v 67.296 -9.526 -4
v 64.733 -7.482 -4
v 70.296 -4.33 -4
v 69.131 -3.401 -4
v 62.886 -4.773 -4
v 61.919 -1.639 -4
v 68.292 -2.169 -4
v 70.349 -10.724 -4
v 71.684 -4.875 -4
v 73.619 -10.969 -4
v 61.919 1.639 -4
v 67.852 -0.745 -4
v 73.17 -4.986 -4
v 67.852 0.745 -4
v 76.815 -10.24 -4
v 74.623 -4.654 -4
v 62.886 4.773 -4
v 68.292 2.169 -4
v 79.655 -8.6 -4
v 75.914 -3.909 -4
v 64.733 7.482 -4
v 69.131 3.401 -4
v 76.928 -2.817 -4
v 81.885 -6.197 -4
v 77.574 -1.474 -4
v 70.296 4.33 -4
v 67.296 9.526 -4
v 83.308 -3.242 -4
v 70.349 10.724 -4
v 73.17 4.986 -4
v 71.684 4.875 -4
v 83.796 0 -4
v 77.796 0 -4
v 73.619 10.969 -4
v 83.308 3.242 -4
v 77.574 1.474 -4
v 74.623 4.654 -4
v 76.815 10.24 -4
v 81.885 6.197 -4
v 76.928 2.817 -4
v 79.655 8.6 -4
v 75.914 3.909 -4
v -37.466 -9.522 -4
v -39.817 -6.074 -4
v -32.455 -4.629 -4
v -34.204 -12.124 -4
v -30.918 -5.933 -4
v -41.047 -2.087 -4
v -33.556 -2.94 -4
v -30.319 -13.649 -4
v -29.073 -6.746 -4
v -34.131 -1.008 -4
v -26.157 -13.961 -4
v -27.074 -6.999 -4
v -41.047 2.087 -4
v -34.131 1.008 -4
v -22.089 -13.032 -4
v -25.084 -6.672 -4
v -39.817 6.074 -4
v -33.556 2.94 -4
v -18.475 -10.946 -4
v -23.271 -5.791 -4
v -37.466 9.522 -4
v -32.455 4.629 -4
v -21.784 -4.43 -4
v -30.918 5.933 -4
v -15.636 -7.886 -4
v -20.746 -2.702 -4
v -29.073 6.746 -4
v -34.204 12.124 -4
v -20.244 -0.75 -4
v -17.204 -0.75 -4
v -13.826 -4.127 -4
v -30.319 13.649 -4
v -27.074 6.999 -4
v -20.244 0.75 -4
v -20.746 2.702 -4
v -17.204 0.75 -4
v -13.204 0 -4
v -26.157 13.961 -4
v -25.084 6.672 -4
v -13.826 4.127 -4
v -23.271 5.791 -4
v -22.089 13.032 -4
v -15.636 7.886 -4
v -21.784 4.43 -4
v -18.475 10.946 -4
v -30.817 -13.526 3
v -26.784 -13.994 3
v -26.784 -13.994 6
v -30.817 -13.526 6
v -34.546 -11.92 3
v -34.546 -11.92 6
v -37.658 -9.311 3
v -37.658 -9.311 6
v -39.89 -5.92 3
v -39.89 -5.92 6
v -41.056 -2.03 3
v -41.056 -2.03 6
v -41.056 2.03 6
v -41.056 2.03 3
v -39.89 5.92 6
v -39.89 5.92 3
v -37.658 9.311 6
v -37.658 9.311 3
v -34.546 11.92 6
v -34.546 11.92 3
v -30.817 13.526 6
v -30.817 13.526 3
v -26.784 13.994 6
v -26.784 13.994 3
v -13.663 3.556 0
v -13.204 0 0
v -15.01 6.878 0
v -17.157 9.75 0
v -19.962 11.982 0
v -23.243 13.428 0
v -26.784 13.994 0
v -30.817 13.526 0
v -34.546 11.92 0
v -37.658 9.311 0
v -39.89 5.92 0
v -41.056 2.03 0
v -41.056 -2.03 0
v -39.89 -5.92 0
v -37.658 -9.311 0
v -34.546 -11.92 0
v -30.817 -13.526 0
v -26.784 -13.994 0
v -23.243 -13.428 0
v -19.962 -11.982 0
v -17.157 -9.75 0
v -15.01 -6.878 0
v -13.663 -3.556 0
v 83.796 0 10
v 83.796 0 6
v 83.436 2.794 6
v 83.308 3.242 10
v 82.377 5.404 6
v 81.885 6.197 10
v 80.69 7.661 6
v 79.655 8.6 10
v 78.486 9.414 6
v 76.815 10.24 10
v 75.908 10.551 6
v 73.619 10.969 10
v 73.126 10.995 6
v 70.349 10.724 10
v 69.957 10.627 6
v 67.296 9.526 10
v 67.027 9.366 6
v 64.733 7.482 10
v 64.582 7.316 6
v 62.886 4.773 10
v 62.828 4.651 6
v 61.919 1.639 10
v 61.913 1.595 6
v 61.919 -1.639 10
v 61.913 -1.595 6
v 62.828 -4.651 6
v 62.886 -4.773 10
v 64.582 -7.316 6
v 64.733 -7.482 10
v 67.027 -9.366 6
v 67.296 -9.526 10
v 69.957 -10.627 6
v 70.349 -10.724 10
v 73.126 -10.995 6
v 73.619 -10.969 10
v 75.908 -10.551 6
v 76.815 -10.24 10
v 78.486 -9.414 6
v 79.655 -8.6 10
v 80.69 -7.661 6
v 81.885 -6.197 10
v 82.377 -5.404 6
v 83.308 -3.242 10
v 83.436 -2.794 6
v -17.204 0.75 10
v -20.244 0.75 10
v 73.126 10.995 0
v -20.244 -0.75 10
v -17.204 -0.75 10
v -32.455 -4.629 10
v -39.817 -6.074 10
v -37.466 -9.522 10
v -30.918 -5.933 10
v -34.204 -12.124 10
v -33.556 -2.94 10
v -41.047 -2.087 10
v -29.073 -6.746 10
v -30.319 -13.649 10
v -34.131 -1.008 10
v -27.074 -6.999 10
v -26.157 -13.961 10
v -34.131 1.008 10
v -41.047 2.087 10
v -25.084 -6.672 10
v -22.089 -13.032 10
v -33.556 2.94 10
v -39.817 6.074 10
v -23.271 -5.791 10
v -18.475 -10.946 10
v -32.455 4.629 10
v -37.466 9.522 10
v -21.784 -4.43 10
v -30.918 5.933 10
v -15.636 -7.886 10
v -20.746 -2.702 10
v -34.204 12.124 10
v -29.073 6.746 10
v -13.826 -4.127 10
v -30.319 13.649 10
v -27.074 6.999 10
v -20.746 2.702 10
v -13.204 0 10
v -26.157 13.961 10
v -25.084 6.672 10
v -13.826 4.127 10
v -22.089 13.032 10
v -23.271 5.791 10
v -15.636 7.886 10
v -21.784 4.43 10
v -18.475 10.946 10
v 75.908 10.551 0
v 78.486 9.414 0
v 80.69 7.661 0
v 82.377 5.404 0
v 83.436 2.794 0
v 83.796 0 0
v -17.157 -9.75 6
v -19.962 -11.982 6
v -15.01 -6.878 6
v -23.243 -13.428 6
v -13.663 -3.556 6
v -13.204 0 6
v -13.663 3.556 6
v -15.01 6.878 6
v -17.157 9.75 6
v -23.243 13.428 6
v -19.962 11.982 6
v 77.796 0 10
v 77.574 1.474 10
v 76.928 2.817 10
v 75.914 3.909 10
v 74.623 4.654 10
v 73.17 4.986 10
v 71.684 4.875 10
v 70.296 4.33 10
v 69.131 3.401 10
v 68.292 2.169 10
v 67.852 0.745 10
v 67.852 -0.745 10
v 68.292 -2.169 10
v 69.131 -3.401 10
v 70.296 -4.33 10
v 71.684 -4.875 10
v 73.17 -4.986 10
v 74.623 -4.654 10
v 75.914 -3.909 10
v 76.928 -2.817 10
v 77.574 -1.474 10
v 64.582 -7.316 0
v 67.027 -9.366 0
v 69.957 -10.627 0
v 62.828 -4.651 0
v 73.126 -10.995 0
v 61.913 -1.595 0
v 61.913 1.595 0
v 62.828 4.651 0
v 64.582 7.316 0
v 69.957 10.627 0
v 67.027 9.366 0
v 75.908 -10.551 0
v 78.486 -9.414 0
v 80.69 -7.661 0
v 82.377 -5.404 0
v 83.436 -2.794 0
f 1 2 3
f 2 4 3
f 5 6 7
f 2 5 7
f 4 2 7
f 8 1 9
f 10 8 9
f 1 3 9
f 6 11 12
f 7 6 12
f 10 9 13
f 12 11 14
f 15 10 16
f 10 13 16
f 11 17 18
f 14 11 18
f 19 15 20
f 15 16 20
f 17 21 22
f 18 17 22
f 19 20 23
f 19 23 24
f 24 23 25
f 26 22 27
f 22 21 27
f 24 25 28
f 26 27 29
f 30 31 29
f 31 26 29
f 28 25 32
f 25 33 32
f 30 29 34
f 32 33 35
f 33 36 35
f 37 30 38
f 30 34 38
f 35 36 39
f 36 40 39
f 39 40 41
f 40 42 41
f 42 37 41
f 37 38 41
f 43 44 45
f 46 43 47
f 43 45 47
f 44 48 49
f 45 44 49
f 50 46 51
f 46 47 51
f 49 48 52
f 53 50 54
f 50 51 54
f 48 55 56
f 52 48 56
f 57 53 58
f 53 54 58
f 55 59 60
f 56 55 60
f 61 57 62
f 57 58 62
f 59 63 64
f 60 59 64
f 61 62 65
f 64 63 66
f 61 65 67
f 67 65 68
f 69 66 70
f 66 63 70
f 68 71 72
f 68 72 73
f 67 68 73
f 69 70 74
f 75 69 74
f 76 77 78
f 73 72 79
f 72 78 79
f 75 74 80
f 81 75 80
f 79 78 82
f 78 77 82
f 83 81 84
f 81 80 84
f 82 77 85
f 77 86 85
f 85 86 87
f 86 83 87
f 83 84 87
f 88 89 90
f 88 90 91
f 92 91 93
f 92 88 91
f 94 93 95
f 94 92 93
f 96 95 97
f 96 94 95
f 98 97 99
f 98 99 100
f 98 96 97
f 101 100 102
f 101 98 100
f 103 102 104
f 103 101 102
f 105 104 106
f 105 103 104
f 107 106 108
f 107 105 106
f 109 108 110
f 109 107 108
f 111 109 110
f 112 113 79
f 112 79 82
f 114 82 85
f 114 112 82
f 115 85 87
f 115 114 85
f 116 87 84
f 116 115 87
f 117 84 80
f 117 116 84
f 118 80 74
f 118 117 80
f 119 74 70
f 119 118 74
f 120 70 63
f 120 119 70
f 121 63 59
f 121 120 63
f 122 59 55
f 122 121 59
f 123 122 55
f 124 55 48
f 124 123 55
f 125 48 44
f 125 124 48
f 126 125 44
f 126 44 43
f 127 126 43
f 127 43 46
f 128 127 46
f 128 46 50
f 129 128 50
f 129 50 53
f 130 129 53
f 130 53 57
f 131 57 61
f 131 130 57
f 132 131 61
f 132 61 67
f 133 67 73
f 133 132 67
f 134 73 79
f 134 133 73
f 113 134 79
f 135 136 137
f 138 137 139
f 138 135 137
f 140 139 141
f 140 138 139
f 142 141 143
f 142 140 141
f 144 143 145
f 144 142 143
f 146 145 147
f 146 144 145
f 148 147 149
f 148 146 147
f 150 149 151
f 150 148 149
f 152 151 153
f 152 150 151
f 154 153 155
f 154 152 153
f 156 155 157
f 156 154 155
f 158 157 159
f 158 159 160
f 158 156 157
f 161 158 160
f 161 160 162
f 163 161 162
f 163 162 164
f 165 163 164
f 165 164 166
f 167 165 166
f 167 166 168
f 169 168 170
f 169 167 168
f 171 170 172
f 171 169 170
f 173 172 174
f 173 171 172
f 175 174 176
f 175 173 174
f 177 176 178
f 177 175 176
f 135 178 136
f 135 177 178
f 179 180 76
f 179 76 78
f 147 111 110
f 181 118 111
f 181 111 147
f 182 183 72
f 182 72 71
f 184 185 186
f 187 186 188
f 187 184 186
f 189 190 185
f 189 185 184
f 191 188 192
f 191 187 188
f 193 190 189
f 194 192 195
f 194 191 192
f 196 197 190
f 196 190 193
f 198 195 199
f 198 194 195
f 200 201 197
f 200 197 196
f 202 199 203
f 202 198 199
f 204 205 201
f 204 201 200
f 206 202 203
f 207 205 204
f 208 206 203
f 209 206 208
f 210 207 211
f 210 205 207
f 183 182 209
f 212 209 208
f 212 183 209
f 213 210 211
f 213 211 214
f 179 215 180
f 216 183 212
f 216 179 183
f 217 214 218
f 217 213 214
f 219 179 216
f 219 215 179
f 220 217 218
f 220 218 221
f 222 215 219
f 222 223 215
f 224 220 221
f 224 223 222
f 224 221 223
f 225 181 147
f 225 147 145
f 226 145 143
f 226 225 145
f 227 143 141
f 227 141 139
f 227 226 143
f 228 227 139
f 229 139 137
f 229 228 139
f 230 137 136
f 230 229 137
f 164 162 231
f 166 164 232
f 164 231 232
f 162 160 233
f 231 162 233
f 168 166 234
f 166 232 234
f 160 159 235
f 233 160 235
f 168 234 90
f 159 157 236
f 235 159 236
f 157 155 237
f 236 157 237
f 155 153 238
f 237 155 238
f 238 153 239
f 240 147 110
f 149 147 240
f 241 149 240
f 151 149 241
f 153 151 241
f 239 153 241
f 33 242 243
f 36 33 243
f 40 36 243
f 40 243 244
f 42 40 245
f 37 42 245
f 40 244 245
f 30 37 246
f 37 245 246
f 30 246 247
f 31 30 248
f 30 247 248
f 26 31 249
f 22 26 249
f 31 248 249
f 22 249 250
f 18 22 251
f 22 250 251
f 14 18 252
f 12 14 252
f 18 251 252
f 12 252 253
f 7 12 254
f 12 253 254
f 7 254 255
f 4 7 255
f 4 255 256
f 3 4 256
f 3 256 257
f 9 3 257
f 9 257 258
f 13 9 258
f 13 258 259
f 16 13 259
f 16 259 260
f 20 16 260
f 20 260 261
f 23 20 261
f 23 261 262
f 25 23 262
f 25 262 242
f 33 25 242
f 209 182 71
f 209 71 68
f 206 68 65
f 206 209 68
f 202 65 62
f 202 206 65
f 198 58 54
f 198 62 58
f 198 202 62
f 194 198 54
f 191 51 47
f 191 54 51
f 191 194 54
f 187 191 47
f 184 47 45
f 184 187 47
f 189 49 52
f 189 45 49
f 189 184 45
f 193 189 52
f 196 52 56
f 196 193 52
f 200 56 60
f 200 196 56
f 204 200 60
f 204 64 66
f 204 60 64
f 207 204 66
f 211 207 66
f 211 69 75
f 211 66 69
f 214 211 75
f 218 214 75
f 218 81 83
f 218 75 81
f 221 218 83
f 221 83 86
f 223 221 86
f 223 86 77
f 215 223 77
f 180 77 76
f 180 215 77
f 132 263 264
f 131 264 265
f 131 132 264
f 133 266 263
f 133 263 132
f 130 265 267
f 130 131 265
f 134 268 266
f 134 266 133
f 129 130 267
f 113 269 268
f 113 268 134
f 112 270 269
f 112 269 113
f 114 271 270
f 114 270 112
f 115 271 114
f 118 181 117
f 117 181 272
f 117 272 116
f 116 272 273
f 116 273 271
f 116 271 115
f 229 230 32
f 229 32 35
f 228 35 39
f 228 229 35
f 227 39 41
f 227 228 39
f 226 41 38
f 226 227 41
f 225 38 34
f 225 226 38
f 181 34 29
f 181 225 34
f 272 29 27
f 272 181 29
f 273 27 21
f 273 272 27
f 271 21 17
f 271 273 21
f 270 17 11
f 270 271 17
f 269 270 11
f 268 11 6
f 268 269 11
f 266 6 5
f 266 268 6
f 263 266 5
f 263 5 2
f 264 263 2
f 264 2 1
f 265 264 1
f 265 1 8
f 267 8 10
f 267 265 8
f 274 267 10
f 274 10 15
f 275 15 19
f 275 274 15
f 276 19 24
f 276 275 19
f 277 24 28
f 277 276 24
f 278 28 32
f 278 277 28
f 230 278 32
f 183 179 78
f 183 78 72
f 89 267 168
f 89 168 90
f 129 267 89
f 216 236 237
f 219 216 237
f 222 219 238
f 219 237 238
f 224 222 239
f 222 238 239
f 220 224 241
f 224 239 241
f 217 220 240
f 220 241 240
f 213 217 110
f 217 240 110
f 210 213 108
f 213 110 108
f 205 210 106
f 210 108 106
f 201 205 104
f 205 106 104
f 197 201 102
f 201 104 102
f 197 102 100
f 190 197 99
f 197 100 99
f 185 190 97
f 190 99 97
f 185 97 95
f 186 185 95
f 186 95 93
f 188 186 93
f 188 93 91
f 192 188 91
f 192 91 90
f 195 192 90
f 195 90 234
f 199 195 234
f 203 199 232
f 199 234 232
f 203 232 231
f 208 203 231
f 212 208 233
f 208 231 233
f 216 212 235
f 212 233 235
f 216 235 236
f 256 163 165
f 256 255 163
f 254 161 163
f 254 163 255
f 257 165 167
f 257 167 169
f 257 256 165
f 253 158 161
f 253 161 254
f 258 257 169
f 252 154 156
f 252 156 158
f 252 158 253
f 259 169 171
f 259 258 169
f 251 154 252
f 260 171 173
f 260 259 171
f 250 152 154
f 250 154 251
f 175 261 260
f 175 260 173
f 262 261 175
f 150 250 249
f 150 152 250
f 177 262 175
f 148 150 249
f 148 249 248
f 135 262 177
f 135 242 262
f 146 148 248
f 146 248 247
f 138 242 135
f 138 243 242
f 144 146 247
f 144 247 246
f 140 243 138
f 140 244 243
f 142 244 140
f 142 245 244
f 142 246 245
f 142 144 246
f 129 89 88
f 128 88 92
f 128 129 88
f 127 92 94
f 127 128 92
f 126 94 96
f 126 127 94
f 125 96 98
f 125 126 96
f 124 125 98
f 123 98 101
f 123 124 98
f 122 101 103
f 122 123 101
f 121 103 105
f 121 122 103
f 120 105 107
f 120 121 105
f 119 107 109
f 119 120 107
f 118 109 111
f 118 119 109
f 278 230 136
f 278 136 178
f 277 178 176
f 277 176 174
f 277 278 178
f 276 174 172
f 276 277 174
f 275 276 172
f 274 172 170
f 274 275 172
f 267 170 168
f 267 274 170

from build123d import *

# Parameters (mm, degrees)
EXTRUDE_1_DEPTH     = 6
SKETCH_3_R          = 14
SKETCH_3_R_2        = 11
EXTRUDE_3_DEPTH     = 7
SKETCH_4_R          = 5
CUT_EXTRUDE_1_DEPTH = 87.103712829


with BuildPart() as part:
    # 草图1 → 凸台-拉伸1 (new body)
    with BuildSketch(Plane.XY):
        with BuildLine():
            Line((-26.783524162, 13.993698582), (73.126475838, 10.995048886))
            ThreePointArc((73.126475838, 10.995048886), (83.796475838, 0), (73.126475838, -10.995048886))
            Line((73.126475838, -10.995048886), (-26.783524162, -13.993698582))
            ThreePointArc((-26.783524162, -13.993698582), (-41.203524162, 0), (-26.783524162, 13.993698582))
        make_face()
    extrude(amount=EXTRUDE_1_DEPTH)

    # 草图3 → 凸台-拉伸3 (add, symmetric)
    with BuildSketch(Plane.XY.offset(3)):
        with Locations((-27.203524162, 0)):
            Circle(SKETCH_3_R)
        with Locations((72.796475838, 0)):
            Circle(SKETCH_3_R_2)
    extrude(amount=EXTRUDE_3_DEPTH, both=True)

    # 草图4 → 切除-拉伸1 (cut, through all)
    with BuildSketch(Plane.XY.offset(10)):
        with Locations((72.796475838, 0)):
            Circle(SKETCH_4_R)
        with BuildLine():
            Line((-20.243818708, 0.75), (-17.203524162, 0.75))
            Line((-17.203524162, 0.75), (-17.203524162, -0.75))
            Line((-17.203524162, -0.75), (-20.243818708, -0.75))
            ThreePointArc((-20.243818708, -0.75), (-34.203524162, 0), (-20.243818708, 0.75))
        make_face()
    extrude(amount=-CUT_EXTRUDE_1_DEPTH, mode=Mode.SUBTRACT)


solid = part.part
